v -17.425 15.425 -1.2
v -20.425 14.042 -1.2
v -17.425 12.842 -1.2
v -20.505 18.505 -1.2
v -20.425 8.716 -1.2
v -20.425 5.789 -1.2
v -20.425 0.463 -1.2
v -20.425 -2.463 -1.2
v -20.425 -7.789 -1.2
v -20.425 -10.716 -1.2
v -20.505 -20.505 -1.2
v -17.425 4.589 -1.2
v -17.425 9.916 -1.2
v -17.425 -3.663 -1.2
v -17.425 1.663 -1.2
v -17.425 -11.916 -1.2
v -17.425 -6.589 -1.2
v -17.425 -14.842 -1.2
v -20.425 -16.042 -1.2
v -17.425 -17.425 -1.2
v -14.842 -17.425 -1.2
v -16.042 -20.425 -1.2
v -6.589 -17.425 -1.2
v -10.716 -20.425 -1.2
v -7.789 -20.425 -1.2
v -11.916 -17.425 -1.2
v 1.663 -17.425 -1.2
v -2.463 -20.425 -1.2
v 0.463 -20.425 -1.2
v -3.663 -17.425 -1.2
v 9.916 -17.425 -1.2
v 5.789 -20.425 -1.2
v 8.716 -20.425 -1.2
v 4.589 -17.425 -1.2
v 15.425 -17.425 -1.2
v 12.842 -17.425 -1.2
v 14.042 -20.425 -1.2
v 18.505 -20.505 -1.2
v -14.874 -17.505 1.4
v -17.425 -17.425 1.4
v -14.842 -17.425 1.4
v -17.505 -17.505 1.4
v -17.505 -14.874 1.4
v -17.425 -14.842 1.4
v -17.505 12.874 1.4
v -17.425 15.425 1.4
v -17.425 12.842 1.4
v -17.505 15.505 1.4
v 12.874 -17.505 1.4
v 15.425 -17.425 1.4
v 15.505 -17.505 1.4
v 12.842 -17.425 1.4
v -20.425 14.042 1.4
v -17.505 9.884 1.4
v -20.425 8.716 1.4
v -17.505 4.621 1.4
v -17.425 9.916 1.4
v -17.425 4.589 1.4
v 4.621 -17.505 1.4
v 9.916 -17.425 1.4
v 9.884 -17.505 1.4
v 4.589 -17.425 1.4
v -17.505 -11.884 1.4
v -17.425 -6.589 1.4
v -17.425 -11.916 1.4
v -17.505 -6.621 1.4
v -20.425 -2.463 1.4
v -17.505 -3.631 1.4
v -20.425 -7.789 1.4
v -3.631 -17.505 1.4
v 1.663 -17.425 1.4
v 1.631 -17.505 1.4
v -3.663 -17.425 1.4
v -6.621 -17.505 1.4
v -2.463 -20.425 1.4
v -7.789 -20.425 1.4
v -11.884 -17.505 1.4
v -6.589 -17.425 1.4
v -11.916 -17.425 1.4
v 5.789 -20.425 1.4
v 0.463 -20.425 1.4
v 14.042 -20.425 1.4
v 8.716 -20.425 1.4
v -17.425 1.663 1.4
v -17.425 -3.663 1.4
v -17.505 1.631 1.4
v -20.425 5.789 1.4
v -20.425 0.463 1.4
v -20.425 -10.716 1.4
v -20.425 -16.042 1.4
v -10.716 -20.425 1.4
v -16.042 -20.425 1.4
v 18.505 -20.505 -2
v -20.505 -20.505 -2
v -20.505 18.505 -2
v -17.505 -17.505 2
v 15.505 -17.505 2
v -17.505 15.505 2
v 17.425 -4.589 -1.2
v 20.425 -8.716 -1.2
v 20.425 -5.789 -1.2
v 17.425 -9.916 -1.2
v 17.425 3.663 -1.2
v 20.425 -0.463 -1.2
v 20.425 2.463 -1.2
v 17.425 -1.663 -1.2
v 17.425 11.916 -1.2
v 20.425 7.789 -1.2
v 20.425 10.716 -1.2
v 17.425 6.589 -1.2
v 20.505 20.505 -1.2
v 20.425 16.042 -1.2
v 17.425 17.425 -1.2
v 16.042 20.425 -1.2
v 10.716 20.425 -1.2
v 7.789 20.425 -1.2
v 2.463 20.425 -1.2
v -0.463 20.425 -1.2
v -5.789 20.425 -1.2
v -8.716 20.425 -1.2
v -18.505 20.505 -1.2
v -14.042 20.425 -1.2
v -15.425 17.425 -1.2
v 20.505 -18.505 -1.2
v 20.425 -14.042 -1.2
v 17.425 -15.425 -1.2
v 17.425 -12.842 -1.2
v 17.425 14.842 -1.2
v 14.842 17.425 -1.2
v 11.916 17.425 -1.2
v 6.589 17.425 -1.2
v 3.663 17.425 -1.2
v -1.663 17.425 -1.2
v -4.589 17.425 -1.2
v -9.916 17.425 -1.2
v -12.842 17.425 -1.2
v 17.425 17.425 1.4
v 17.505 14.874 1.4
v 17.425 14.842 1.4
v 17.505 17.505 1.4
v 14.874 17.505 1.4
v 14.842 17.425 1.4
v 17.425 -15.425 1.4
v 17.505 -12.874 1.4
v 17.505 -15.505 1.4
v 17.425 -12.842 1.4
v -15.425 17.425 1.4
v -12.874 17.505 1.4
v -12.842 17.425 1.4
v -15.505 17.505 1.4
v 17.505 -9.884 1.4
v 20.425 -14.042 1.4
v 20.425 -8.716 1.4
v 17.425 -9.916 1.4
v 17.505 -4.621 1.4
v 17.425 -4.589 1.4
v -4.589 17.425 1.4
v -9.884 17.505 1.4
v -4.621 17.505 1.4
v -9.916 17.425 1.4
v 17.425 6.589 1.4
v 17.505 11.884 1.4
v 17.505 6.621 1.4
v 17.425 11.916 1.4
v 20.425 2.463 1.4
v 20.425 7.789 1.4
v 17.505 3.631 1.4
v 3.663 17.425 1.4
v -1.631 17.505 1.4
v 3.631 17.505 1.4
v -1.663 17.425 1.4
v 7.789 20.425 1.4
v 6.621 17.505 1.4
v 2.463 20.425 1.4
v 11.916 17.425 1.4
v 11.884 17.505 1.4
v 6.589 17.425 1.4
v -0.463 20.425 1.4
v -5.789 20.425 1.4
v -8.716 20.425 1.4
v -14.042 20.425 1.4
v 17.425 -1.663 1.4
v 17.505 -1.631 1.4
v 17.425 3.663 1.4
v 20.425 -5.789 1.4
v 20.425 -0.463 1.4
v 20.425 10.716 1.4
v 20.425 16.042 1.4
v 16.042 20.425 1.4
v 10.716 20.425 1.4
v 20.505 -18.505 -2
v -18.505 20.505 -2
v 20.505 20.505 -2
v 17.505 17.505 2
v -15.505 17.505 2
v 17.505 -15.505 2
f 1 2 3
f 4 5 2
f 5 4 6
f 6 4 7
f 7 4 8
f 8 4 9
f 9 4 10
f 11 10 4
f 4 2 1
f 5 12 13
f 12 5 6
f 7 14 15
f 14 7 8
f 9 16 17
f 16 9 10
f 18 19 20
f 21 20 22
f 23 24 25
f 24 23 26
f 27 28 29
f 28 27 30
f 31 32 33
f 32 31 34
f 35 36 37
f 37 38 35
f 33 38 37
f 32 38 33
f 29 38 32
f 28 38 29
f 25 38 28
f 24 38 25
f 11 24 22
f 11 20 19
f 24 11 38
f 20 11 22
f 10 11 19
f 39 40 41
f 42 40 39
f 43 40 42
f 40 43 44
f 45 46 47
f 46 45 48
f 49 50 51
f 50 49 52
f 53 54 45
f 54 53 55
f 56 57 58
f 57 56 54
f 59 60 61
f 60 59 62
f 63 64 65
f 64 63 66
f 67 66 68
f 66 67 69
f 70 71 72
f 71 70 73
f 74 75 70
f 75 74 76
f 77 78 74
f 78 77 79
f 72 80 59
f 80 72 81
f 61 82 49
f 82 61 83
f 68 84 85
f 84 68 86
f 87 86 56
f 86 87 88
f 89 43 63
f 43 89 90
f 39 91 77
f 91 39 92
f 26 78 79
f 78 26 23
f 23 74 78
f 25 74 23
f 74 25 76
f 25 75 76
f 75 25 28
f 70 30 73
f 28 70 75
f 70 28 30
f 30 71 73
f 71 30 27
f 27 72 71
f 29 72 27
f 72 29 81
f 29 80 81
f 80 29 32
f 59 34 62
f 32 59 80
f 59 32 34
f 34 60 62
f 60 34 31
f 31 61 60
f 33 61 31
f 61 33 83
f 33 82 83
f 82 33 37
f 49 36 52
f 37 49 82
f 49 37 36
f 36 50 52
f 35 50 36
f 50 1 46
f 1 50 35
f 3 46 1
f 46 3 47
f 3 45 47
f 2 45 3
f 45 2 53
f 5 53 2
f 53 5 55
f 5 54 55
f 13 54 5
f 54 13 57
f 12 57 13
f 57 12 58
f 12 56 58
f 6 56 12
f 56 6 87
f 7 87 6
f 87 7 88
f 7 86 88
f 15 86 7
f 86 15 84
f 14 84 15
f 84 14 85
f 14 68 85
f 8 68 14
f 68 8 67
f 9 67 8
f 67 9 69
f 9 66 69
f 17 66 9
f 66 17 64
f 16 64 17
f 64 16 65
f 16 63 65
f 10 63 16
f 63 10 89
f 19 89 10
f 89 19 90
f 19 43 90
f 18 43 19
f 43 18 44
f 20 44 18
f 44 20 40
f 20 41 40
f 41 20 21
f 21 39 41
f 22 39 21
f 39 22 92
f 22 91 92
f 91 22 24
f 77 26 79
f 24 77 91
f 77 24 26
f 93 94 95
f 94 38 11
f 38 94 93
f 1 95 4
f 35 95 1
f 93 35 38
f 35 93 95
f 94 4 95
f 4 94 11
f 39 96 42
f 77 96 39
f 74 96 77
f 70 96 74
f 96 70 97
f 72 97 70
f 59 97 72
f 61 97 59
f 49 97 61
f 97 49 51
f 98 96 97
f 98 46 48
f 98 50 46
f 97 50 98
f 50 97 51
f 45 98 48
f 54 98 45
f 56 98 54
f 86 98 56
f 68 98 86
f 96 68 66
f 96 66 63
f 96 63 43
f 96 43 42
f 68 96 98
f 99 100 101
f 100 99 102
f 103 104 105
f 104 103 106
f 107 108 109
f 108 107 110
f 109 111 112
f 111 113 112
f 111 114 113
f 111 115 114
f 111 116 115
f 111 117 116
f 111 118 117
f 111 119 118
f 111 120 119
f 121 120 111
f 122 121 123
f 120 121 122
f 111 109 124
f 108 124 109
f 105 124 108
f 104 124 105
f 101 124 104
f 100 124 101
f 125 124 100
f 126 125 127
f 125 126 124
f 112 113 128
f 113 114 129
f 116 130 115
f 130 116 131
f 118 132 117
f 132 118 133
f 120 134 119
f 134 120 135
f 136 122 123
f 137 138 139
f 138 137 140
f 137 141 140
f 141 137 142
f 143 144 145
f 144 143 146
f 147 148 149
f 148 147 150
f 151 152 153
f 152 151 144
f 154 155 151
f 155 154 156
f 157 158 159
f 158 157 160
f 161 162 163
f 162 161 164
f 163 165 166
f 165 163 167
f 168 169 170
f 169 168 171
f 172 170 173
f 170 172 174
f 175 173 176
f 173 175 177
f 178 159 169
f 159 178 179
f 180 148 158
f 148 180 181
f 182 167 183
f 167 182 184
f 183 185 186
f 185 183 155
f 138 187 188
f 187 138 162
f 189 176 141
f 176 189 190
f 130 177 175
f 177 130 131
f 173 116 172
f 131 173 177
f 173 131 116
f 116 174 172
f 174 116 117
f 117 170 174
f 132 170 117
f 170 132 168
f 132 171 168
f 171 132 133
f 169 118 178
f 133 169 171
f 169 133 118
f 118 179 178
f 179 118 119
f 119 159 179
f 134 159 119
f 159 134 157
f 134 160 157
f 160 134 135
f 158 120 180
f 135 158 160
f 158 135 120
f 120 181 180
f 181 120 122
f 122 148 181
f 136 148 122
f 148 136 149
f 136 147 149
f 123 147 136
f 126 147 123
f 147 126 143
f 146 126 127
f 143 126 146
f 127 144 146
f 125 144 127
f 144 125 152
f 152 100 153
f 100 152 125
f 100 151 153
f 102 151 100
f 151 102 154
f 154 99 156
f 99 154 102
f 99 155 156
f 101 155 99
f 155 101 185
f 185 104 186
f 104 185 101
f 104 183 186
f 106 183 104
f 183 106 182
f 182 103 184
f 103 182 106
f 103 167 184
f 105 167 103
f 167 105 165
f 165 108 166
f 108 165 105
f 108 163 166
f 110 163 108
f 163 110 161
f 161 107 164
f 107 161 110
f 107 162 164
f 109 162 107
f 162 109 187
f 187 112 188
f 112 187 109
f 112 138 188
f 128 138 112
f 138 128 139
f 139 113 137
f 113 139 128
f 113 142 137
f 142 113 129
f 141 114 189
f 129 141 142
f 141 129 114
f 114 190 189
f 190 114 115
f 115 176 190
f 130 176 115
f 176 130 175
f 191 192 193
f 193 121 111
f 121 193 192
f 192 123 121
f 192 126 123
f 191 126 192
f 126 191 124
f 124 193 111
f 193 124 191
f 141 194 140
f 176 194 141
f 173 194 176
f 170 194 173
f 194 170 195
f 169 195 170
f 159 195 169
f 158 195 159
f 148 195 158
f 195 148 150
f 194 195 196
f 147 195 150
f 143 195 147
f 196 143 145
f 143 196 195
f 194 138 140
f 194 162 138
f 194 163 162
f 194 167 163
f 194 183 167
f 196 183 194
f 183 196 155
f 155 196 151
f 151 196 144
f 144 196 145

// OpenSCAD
w = 4;
cover = 0.6;
cover_gap = 0.2;
dovetail_tension = 0.08;
dovetail_shape = 0.4;
dovetail_depth = 3;

wall_angle = 45;
fold_angle = 20;

hinge_wall = 7;
hinge_gap = 0.3;
hinge_hole_d = 2.2;
hinge_inner_d = 1.8;

depth = w/2/tan(fold_angle);
offs = depth-w/2*tan(wall_angle);

$fn = 40;

module roundpoly(v) {
    hull() {
        for (i=[0:1:len(v)-1]) 
            translate(v[i]) {
            cylinder(d=0.1,h=w,center=true);
            cylinder(d=w,h=0.1,center=true);
        }
    }
}

function vert4(e) = 
    let(a = e/2 - offs - w/2) 
    [[-a,-a],[a,-a],[a,a],[-a,a]];

module hinge_piece(l, b) {
    h_middle = l-hinge_wall-hinge_gap;
    difference() {
        union() {
            cylinder(d=w, h=h_middle, center=true);
            translate([0,b/2,0])
            cube([w,b,h_middle],center=true);
        }
        cylinder(d=hinge_hole_d, h=l, center=true);
    }
    cylinder(d=hinge_inner_d, h=l, center=true);
    difference() {
        cylinder(d=w, h=l, center=true);
        cylinder(d=w+1,h=l-hinge_wall,center=true);
    }
    translate([0,-b/2,0]) difference() {
        cube([w,b,l],center=true);
        cube([w+1,b+1,l-hinge_wall],center=true);
    }
    intersection() {
        cube([w,2*b,l],center=true);
        difference() {
            for (y=[-b,b]) translate([0,y,0])
            rotate(45)
            cube([w/sqrt(2),w/sqrt(2),l],center=true);
            cylinder(d=w+1,h=l+1,center=true);
        }
    }
}

module hinge_pieces(l, b, n) {
    translate([0,0,l/2/n-l/2])
    for (i=[0:1:n-1])
        translate([0,0,i*l/n])
        hinge_piece(l/n,b);
}

module add_hinge(p,q,n) {
    m=(p+q)/2;
    v=q-p;
    ang=atan2(v[1],v[0]);
    translate(m)
    rotate(ang)
    rotate([0,90,0])
    hinge_pieces(norm(v), depth, n);
    difference() {
        children();
        translate(m) rotate(ang) 
        cube([norm(m),2*w,2*w], center=true);
    }
}

function zig(length, tension_direction, y_dir) = 
    let(d=-y_dir*dovetail_depth/2*dovetail_shape)
    let(x=length/4)
    let(t=tension_direction*dovetail_tension*y_dir)
    [
        [0, t],
        [x+d, t],
        [x-d, t+dovetail_depth*y_dir],
        [3*x+d, t+dovetail_depth*y_dir],
        [3*x-d, t],
        [length, t]
    ];

function move(pt, vec) = [for (p=vec) p+pt];
    
function flatten(v) = [for(vv=v) for (x=vv) x];
    
e = 50;
vs = vert4(e);
A = abs(vs[0][0]);
E = e/2;
D = E-A;
F = D + dovetail_depth;// + w/2/sqrt(2);
G = A - dovetail_depth;// - w/2/sqrt(2);

module keep_for_face_large() {
    translate([0,0,w/2-cover])
    linear_extrude(cover)
    polygon([[G,F],[-G,2*E-F],[-G,F]]);
}

module keep_for_face_small() {
    translate([0,0,-w/2])
    linear_extrude(cover+cover_gap)
    polygon([[A,D],[-A,2*E-D],[-A,D]]);
}

function rot90(v) = [for(p=v) [p[1],-p[0]]];

module keep_for_face_middle() {
    v = flatten([
        move([0,E], rot90(move([-G,F-E], zigs(2*G, 4, -1, -1)))),
        [[1-E,0],[E,0],[E,2*E],[1-E,2*E]],
    ]);
    translate([0,0,-w/2+cover+cover_gap])
    linear_extrude(w-2*cover-cover_gap)
    intersection() {
        polygon(v);
        polygon([[-E,0],[E,0],[-E,2*E]]);
        translate([0,E,0])
        rotate(90)
        translate([0,-E,0]) polygon(v);
    }
}

module keep_for_hinge_large() {
    translate([0,0,w/2-cover])
    linear_extrude(cover)
    polygon(flatten(
    [
        [[E,0],[G,F],[-G,F],[-E,0],[-G,-F],[G,-F]]
    ]
    ));
}

module keep_for_hinge_small() {
    translate([0,0,-w/2])
    linear_extrude(cover+cover_gap)
    polygon(flatten(
    [
        [[E,0],[A,D],[-A,D],[-E,0],[-A,-D],[A,-D]]
    ]
    ));
}

function zigs(length, n, tension_direction, y_dir) =
    flatten([
        for(i=[0:1:n-1]) 
            move(
                [length/n*i,0],
                zig(length/n, tension_direction, y_dir))
    ]);


module keep_for_hinge_middle() {
    translate([0,0,-w/2+cover+cover_gap])
    linear_extrude(w-2*cover-cover_gap)
    polygon(flatten(
    [
        [[-E,0],[-G,F]],
        move([-G,F], zigs(2*G, 4, 1, -1)),
        [[E,0],[G,-F]],
        move([G,-F], zigs(-2*G, 4, 1, 1)),
    ]
    ));
}


module connected() { 
    add_hinge([-A,0],[A,0],3) 
    for (a=[0,180]) rotate(a)
    translate([0,e/2,0])
    roundpoly(vs);
}

module conn() {
    intersection() {
        connected();
        union() {
            keep_for_hinge_small();
            keep_for_hinge_large();
            keep_for_hinge_middle();
        }
    }
}

module face() {
    keep_for_face_middle();
    keep_for_face_small();
    keep_for_face_large();
}

/*
mirror([0,0,1])
translate([0,-6,0])
color("red")
conn();
*/
for (a=[0,180]) rotate(a)
translate([-1,-E-1,0])
face();
